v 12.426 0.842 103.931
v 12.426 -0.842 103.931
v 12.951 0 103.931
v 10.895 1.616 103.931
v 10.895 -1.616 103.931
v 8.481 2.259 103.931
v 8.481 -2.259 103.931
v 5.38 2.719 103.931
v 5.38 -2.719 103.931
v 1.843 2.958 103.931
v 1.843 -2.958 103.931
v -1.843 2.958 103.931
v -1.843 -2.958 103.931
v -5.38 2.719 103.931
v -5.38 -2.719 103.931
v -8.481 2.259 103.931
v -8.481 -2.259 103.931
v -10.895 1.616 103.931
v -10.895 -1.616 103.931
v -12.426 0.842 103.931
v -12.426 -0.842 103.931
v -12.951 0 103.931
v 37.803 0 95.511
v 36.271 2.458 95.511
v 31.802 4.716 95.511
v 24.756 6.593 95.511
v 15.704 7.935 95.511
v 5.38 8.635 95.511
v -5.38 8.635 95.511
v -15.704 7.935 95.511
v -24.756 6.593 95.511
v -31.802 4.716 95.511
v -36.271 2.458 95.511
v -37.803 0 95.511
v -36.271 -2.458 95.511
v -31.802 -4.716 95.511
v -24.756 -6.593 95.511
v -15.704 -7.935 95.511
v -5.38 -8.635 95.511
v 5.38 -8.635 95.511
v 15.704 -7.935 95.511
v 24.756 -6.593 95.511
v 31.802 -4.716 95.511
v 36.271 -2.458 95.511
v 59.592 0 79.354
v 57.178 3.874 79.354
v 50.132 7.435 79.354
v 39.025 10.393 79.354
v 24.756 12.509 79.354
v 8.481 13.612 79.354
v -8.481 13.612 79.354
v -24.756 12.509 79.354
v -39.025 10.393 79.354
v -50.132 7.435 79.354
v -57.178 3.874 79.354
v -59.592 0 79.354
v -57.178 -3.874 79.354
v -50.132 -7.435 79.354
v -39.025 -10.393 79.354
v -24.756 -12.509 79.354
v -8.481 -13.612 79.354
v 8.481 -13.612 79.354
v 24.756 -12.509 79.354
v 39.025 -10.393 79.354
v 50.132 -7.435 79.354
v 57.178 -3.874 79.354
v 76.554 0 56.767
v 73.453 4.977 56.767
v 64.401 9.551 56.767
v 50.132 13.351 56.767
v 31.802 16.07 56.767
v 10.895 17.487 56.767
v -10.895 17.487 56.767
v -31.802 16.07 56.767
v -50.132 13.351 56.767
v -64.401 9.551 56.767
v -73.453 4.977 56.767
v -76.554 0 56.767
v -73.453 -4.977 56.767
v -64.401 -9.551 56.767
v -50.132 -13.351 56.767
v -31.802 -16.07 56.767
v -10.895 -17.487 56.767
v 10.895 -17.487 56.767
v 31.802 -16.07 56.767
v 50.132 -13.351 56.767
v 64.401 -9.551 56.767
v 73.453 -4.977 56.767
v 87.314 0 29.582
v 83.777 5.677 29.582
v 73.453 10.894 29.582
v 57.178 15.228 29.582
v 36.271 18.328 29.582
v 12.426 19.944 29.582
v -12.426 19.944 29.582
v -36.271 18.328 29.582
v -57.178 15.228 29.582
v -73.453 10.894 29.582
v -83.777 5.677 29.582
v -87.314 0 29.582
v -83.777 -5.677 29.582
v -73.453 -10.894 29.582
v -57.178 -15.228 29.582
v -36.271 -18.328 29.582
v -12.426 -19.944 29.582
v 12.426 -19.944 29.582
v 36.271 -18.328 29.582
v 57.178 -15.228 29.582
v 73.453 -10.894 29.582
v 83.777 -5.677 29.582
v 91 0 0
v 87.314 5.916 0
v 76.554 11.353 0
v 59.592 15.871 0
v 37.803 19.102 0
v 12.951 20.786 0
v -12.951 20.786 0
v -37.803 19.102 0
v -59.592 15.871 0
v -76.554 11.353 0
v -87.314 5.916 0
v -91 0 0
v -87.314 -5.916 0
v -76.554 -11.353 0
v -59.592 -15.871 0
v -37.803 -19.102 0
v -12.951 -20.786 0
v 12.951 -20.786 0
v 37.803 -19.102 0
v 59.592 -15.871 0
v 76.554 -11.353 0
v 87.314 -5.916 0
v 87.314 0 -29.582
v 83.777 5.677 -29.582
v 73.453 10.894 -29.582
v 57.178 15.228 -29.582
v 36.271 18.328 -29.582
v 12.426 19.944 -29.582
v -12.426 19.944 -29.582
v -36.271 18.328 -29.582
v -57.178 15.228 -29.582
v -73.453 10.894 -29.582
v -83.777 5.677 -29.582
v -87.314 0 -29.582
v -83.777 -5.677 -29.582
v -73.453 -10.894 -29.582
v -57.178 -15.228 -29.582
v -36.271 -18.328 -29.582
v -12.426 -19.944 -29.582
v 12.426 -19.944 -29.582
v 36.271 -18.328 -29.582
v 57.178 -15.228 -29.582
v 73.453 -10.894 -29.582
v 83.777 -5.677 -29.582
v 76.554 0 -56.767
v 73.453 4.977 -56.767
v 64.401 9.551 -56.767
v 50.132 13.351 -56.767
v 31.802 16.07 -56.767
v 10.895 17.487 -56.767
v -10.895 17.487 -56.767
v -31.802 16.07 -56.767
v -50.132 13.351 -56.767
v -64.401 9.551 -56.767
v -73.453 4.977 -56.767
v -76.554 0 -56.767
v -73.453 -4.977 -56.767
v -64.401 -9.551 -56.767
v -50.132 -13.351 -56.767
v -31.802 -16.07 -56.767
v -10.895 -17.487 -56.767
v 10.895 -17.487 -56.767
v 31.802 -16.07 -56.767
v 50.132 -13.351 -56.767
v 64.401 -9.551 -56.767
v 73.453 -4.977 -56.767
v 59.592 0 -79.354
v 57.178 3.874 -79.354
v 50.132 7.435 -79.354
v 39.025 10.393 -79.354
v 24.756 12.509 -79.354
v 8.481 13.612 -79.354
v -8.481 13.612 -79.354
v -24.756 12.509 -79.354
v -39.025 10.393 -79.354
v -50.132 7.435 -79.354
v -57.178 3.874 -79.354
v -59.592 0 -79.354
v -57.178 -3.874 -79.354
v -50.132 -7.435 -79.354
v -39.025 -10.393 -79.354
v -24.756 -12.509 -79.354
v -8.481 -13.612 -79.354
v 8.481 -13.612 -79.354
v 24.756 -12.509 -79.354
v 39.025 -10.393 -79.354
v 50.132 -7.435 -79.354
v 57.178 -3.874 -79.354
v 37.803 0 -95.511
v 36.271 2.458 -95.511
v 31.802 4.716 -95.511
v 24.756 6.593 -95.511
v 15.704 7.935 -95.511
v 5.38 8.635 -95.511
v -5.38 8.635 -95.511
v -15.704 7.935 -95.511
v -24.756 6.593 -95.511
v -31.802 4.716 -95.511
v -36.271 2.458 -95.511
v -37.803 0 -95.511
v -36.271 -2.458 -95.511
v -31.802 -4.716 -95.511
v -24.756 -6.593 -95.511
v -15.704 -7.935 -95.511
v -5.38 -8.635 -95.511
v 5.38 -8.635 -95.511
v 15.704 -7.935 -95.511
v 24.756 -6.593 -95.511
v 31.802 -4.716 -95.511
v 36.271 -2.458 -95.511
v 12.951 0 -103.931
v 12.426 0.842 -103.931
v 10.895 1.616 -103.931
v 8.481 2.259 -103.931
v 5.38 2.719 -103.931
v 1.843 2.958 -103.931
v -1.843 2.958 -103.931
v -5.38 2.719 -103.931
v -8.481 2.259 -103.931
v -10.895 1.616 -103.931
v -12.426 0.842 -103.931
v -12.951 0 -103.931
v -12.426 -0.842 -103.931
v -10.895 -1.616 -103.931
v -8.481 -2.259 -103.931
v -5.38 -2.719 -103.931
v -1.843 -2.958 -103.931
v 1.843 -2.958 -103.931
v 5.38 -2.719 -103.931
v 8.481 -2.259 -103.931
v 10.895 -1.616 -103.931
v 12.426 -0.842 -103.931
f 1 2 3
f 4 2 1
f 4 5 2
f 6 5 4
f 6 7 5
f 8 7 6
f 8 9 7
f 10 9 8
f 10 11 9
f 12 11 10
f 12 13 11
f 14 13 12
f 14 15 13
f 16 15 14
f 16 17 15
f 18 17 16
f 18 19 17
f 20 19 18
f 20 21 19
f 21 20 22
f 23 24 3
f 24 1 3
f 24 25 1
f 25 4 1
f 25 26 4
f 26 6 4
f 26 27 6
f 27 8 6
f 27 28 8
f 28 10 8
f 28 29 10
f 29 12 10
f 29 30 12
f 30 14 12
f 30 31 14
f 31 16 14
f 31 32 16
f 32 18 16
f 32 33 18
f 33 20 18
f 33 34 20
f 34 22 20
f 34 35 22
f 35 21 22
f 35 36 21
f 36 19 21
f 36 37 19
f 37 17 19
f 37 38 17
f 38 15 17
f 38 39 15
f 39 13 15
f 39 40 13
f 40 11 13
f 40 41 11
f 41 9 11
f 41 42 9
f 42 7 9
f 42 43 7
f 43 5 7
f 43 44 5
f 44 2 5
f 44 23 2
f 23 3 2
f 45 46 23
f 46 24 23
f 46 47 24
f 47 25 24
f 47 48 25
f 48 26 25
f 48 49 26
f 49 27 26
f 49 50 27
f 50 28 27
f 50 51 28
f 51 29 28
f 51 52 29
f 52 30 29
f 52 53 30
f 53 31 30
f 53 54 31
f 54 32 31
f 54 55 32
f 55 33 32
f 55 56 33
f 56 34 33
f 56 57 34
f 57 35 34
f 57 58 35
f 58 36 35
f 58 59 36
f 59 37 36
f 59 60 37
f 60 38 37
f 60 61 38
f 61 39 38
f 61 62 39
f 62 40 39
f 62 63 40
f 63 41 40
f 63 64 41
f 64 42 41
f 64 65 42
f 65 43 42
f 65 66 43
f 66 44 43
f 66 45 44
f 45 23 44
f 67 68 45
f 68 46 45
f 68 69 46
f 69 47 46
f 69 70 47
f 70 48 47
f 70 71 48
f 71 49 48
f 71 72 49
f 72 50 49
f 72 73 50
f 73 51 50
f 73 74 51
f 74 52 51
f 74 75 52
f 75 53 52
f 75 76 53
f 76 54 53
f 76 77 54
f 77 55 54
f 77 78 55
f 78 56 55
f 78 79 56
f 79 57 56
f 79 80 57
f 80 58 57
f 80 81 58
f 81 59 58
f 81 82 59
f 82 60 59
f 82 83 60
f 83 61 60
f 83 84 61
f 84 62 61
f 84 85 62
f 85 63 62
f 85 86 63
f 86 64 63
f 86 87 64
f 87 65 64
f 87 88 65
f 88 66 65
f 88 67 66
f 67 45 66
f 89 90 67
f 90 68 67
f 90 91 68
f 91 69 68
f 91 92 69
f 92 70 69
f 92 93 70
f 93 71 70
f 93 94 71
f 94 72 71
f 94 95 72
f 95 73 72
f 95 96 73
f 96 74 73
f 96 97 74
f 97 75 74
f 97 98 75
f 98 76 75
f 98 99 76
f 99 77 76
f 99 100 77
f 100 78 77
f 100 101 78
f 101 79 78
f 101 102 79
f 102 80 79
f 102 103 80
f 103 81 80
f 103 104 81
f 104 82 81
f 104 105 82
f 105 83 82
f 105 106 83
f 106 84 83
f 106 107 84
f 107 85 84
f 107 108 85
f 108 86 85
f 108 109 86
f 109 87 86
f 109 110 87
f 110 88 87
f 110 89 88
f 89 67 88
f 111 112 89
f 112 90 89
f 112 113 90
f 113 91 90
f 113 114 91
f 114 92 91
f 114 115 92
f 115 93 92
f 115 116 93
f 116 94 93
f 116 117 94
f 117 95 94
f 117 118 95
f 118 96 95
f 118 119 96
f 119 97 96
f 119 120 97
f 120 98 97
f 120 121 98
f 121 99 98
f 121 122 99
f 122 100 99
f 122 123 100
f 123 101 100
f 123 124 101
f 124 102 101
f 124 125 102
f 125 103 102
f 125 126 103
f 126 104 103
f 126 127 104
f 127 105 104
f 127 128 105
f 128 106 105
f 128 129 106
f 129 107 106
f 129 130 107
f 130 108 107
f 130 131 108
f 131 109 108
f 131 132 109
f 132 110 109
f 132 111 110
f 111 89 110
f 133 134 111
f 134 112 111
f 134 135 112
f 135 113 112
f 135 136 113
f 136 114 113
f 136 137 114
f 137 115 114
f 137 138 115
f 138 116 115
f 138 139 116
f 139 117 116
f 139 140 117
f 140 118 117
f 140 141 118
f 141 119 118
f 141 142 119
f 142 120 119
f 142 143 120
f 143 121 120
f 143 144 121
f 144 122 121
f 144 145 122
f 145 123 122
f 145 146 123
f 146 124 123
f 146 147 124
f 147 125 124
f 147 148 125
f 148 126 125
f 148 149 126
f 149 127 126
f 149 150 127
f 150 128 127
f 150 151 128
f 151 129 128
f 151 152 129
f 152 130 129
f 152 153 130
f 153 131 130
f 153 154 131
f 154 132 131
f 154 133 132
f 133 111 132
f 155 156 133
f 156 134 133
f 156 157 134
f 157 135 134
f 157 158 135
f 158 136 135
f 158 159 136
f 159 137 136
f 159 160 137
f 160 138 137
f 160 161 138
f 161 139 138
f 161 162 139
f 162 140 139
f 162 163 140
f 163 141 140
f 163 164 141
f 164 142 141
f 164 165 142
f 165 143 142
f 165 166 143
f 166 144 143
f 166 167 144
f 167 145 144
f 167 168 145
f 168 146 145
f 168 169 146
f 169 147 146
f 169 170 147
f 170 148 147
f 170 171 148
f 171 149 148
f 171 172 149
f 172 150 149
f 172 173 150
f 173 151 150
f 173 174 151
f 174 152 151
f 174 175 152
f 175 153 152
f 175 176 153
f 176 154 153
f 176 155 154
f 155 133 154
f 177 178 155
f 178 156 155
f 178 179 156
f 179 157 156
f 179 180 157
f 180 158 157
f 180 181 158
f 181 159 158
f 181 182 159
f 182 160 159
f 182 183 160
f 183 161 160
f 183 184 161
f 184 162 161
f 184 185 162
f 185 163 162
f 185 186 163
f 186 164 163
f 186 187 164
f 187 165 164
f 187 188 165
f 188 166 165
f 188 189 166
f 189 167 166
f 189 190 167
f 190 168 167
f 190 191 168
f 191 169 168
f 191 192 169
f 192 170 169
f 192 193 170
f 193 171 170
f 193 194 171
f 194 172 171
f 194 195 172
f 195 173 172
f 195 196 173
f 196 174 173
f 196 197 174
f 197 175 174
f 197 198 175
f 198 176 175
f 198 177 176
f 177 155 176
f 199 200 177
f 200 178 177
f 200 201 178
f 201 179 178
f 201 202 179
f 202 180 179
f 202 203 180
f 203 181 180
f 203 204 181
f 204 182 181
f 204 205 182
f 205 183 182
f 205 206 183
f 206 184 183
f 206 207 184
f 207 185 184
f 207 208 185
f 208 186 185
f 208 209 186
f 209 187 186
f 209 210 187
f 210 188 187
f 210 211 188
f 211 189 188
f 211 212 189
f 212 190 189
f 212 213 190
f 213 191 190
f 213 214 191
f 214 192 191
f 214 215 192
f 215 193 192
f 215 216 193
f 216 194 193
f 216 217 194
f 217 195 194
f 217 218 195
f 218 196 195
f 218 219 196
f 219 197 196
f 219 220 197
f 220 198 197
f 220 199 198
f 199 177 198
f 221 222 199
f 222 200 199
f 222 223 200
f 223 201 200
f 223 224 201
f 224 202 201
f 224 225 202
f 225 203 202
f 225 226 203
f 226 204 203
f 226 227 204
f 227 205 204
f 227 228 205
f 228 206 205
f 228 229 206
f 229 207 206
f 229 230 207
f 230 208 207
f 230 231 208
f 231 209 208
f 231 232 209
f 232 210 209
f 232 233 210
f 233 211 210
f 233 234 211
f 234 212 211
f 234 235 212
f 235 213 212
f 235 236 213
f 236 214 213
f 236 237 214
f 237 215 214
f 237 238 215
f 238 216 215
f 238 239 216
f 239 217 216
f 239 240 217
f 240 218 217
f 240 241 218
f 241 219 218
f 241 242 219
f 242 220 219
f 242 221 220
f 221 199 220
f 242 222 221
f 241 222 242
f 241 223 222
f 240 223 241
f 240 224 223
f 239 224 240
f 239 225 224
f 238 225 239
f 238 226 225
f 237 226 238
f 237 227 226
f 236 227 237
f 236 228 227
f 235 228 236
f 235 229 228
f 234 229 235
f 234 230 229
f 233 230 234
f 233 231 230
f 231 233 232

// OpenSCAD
// Generated by SolidPython 1.0.1 on 2020-07-29 00:46:50


scale(v = [13, 3, 15]) {
	sphere(r = 7);
}
/***********************************************
*********      SolidPython code:      **********
************************************************
 
# import packages: SolidPython
from solid import *
from solid.utils import *
from itertools import chain, combinations, permutations


class Resize:

    def __init__(self, scad_file):
        self.scad_file = scad_file
        #self.scad_file = import_scad(scad_file)
        # cone/cylinder param:
        self.r1 = 0
        self.r2 = 0
        self.h = 0
        # rectangular prism param:
        self.w = 0
        self.l = 0
        # ellipse param:
        self.r = 0

    # import OpenScad code (file name corresponds to shape)


    # classify shape + parameters
    def assign(self, param1, param2, param3):
        if self.scad_file == 'cone.scad':
            self.r1 = param1
            self.r2 = param2
            self.h = param3
        elif self.scad_file == 'cylinder.scad':
            self.r1 = param1
            self.r2 = param2
            self.h = param3
        elif self.scad_file == 'rectangularPrism.scad':
            self.h = param1
            self.l = param2
            self.w = param3
        else:
            self.r = param1
            self.h = param2

    # resize parameters
    def iterate(self):
        x = range(3, 20, 2)
        i = 1
        if self.scad_file == 'cone.scad':
            tempList = list(permutations(x, 2))
            for temp in tempList:
                param1 = temp[0]
                param2 = temp[1]
                filepath = 'produced_scad_files/' + 'cone' + str(param1) + '_' + str(param2) + '_' + '.scad'
                scad_render_to_file(cylinder(h=param1, r1=param2, r2=0), filepath)

        elif self.scad_file == 'cylinder.scad':
            tempList = list(permutations(x, 3))
            for temp in tempList:
                param1 = temp[0]
                param2 = temp[1]
                filepath = 'produced_scad_files/' + 'cylinder' + str(param1) + '_' + str(param2) + '_' + '.scad'
                scad_render_to_file(cylinder(h=param1, r1=param2, r2=param2), filepath)

        elif self.scad_file == 'rectangularPrism.scad':
            tempList = list(permutations(x, 3))
            for temp in tempList:
                param1 = temp[0]
                param2 = temp[1]
                param3 = temp[2]
                filepath = 'produced_scad_files/' + 'rectangularPrism' + str(param1) + '_' + str(param2) + '_' + str(
                    param3) + '.scad'
                scad_render_to_file(cube(size=(param1, param2, param3)), filepath)

        elif self.scad_file == 'ellipse.scad':
            tempList = list(permutations(x, 4))
            for temp in tempList:
                param1 = temp[0]
                param2 = temp[1]
                param3 = temp[2]
                param4 = temp[3]
                filepath = 'produced_scad_files/' + 'ellipse' + str(param1) + '_' + str(param2) + '_' + str(param3) + '_' + str(param4) + '.scad'
                scad_render_to_file(scale([param1, param2, param3])(sphere(r=param4)), filepath)

    def render_to_scadfile(self):
        scad_render_to_file(scad, 'example.scad') 
 
************************************************/
